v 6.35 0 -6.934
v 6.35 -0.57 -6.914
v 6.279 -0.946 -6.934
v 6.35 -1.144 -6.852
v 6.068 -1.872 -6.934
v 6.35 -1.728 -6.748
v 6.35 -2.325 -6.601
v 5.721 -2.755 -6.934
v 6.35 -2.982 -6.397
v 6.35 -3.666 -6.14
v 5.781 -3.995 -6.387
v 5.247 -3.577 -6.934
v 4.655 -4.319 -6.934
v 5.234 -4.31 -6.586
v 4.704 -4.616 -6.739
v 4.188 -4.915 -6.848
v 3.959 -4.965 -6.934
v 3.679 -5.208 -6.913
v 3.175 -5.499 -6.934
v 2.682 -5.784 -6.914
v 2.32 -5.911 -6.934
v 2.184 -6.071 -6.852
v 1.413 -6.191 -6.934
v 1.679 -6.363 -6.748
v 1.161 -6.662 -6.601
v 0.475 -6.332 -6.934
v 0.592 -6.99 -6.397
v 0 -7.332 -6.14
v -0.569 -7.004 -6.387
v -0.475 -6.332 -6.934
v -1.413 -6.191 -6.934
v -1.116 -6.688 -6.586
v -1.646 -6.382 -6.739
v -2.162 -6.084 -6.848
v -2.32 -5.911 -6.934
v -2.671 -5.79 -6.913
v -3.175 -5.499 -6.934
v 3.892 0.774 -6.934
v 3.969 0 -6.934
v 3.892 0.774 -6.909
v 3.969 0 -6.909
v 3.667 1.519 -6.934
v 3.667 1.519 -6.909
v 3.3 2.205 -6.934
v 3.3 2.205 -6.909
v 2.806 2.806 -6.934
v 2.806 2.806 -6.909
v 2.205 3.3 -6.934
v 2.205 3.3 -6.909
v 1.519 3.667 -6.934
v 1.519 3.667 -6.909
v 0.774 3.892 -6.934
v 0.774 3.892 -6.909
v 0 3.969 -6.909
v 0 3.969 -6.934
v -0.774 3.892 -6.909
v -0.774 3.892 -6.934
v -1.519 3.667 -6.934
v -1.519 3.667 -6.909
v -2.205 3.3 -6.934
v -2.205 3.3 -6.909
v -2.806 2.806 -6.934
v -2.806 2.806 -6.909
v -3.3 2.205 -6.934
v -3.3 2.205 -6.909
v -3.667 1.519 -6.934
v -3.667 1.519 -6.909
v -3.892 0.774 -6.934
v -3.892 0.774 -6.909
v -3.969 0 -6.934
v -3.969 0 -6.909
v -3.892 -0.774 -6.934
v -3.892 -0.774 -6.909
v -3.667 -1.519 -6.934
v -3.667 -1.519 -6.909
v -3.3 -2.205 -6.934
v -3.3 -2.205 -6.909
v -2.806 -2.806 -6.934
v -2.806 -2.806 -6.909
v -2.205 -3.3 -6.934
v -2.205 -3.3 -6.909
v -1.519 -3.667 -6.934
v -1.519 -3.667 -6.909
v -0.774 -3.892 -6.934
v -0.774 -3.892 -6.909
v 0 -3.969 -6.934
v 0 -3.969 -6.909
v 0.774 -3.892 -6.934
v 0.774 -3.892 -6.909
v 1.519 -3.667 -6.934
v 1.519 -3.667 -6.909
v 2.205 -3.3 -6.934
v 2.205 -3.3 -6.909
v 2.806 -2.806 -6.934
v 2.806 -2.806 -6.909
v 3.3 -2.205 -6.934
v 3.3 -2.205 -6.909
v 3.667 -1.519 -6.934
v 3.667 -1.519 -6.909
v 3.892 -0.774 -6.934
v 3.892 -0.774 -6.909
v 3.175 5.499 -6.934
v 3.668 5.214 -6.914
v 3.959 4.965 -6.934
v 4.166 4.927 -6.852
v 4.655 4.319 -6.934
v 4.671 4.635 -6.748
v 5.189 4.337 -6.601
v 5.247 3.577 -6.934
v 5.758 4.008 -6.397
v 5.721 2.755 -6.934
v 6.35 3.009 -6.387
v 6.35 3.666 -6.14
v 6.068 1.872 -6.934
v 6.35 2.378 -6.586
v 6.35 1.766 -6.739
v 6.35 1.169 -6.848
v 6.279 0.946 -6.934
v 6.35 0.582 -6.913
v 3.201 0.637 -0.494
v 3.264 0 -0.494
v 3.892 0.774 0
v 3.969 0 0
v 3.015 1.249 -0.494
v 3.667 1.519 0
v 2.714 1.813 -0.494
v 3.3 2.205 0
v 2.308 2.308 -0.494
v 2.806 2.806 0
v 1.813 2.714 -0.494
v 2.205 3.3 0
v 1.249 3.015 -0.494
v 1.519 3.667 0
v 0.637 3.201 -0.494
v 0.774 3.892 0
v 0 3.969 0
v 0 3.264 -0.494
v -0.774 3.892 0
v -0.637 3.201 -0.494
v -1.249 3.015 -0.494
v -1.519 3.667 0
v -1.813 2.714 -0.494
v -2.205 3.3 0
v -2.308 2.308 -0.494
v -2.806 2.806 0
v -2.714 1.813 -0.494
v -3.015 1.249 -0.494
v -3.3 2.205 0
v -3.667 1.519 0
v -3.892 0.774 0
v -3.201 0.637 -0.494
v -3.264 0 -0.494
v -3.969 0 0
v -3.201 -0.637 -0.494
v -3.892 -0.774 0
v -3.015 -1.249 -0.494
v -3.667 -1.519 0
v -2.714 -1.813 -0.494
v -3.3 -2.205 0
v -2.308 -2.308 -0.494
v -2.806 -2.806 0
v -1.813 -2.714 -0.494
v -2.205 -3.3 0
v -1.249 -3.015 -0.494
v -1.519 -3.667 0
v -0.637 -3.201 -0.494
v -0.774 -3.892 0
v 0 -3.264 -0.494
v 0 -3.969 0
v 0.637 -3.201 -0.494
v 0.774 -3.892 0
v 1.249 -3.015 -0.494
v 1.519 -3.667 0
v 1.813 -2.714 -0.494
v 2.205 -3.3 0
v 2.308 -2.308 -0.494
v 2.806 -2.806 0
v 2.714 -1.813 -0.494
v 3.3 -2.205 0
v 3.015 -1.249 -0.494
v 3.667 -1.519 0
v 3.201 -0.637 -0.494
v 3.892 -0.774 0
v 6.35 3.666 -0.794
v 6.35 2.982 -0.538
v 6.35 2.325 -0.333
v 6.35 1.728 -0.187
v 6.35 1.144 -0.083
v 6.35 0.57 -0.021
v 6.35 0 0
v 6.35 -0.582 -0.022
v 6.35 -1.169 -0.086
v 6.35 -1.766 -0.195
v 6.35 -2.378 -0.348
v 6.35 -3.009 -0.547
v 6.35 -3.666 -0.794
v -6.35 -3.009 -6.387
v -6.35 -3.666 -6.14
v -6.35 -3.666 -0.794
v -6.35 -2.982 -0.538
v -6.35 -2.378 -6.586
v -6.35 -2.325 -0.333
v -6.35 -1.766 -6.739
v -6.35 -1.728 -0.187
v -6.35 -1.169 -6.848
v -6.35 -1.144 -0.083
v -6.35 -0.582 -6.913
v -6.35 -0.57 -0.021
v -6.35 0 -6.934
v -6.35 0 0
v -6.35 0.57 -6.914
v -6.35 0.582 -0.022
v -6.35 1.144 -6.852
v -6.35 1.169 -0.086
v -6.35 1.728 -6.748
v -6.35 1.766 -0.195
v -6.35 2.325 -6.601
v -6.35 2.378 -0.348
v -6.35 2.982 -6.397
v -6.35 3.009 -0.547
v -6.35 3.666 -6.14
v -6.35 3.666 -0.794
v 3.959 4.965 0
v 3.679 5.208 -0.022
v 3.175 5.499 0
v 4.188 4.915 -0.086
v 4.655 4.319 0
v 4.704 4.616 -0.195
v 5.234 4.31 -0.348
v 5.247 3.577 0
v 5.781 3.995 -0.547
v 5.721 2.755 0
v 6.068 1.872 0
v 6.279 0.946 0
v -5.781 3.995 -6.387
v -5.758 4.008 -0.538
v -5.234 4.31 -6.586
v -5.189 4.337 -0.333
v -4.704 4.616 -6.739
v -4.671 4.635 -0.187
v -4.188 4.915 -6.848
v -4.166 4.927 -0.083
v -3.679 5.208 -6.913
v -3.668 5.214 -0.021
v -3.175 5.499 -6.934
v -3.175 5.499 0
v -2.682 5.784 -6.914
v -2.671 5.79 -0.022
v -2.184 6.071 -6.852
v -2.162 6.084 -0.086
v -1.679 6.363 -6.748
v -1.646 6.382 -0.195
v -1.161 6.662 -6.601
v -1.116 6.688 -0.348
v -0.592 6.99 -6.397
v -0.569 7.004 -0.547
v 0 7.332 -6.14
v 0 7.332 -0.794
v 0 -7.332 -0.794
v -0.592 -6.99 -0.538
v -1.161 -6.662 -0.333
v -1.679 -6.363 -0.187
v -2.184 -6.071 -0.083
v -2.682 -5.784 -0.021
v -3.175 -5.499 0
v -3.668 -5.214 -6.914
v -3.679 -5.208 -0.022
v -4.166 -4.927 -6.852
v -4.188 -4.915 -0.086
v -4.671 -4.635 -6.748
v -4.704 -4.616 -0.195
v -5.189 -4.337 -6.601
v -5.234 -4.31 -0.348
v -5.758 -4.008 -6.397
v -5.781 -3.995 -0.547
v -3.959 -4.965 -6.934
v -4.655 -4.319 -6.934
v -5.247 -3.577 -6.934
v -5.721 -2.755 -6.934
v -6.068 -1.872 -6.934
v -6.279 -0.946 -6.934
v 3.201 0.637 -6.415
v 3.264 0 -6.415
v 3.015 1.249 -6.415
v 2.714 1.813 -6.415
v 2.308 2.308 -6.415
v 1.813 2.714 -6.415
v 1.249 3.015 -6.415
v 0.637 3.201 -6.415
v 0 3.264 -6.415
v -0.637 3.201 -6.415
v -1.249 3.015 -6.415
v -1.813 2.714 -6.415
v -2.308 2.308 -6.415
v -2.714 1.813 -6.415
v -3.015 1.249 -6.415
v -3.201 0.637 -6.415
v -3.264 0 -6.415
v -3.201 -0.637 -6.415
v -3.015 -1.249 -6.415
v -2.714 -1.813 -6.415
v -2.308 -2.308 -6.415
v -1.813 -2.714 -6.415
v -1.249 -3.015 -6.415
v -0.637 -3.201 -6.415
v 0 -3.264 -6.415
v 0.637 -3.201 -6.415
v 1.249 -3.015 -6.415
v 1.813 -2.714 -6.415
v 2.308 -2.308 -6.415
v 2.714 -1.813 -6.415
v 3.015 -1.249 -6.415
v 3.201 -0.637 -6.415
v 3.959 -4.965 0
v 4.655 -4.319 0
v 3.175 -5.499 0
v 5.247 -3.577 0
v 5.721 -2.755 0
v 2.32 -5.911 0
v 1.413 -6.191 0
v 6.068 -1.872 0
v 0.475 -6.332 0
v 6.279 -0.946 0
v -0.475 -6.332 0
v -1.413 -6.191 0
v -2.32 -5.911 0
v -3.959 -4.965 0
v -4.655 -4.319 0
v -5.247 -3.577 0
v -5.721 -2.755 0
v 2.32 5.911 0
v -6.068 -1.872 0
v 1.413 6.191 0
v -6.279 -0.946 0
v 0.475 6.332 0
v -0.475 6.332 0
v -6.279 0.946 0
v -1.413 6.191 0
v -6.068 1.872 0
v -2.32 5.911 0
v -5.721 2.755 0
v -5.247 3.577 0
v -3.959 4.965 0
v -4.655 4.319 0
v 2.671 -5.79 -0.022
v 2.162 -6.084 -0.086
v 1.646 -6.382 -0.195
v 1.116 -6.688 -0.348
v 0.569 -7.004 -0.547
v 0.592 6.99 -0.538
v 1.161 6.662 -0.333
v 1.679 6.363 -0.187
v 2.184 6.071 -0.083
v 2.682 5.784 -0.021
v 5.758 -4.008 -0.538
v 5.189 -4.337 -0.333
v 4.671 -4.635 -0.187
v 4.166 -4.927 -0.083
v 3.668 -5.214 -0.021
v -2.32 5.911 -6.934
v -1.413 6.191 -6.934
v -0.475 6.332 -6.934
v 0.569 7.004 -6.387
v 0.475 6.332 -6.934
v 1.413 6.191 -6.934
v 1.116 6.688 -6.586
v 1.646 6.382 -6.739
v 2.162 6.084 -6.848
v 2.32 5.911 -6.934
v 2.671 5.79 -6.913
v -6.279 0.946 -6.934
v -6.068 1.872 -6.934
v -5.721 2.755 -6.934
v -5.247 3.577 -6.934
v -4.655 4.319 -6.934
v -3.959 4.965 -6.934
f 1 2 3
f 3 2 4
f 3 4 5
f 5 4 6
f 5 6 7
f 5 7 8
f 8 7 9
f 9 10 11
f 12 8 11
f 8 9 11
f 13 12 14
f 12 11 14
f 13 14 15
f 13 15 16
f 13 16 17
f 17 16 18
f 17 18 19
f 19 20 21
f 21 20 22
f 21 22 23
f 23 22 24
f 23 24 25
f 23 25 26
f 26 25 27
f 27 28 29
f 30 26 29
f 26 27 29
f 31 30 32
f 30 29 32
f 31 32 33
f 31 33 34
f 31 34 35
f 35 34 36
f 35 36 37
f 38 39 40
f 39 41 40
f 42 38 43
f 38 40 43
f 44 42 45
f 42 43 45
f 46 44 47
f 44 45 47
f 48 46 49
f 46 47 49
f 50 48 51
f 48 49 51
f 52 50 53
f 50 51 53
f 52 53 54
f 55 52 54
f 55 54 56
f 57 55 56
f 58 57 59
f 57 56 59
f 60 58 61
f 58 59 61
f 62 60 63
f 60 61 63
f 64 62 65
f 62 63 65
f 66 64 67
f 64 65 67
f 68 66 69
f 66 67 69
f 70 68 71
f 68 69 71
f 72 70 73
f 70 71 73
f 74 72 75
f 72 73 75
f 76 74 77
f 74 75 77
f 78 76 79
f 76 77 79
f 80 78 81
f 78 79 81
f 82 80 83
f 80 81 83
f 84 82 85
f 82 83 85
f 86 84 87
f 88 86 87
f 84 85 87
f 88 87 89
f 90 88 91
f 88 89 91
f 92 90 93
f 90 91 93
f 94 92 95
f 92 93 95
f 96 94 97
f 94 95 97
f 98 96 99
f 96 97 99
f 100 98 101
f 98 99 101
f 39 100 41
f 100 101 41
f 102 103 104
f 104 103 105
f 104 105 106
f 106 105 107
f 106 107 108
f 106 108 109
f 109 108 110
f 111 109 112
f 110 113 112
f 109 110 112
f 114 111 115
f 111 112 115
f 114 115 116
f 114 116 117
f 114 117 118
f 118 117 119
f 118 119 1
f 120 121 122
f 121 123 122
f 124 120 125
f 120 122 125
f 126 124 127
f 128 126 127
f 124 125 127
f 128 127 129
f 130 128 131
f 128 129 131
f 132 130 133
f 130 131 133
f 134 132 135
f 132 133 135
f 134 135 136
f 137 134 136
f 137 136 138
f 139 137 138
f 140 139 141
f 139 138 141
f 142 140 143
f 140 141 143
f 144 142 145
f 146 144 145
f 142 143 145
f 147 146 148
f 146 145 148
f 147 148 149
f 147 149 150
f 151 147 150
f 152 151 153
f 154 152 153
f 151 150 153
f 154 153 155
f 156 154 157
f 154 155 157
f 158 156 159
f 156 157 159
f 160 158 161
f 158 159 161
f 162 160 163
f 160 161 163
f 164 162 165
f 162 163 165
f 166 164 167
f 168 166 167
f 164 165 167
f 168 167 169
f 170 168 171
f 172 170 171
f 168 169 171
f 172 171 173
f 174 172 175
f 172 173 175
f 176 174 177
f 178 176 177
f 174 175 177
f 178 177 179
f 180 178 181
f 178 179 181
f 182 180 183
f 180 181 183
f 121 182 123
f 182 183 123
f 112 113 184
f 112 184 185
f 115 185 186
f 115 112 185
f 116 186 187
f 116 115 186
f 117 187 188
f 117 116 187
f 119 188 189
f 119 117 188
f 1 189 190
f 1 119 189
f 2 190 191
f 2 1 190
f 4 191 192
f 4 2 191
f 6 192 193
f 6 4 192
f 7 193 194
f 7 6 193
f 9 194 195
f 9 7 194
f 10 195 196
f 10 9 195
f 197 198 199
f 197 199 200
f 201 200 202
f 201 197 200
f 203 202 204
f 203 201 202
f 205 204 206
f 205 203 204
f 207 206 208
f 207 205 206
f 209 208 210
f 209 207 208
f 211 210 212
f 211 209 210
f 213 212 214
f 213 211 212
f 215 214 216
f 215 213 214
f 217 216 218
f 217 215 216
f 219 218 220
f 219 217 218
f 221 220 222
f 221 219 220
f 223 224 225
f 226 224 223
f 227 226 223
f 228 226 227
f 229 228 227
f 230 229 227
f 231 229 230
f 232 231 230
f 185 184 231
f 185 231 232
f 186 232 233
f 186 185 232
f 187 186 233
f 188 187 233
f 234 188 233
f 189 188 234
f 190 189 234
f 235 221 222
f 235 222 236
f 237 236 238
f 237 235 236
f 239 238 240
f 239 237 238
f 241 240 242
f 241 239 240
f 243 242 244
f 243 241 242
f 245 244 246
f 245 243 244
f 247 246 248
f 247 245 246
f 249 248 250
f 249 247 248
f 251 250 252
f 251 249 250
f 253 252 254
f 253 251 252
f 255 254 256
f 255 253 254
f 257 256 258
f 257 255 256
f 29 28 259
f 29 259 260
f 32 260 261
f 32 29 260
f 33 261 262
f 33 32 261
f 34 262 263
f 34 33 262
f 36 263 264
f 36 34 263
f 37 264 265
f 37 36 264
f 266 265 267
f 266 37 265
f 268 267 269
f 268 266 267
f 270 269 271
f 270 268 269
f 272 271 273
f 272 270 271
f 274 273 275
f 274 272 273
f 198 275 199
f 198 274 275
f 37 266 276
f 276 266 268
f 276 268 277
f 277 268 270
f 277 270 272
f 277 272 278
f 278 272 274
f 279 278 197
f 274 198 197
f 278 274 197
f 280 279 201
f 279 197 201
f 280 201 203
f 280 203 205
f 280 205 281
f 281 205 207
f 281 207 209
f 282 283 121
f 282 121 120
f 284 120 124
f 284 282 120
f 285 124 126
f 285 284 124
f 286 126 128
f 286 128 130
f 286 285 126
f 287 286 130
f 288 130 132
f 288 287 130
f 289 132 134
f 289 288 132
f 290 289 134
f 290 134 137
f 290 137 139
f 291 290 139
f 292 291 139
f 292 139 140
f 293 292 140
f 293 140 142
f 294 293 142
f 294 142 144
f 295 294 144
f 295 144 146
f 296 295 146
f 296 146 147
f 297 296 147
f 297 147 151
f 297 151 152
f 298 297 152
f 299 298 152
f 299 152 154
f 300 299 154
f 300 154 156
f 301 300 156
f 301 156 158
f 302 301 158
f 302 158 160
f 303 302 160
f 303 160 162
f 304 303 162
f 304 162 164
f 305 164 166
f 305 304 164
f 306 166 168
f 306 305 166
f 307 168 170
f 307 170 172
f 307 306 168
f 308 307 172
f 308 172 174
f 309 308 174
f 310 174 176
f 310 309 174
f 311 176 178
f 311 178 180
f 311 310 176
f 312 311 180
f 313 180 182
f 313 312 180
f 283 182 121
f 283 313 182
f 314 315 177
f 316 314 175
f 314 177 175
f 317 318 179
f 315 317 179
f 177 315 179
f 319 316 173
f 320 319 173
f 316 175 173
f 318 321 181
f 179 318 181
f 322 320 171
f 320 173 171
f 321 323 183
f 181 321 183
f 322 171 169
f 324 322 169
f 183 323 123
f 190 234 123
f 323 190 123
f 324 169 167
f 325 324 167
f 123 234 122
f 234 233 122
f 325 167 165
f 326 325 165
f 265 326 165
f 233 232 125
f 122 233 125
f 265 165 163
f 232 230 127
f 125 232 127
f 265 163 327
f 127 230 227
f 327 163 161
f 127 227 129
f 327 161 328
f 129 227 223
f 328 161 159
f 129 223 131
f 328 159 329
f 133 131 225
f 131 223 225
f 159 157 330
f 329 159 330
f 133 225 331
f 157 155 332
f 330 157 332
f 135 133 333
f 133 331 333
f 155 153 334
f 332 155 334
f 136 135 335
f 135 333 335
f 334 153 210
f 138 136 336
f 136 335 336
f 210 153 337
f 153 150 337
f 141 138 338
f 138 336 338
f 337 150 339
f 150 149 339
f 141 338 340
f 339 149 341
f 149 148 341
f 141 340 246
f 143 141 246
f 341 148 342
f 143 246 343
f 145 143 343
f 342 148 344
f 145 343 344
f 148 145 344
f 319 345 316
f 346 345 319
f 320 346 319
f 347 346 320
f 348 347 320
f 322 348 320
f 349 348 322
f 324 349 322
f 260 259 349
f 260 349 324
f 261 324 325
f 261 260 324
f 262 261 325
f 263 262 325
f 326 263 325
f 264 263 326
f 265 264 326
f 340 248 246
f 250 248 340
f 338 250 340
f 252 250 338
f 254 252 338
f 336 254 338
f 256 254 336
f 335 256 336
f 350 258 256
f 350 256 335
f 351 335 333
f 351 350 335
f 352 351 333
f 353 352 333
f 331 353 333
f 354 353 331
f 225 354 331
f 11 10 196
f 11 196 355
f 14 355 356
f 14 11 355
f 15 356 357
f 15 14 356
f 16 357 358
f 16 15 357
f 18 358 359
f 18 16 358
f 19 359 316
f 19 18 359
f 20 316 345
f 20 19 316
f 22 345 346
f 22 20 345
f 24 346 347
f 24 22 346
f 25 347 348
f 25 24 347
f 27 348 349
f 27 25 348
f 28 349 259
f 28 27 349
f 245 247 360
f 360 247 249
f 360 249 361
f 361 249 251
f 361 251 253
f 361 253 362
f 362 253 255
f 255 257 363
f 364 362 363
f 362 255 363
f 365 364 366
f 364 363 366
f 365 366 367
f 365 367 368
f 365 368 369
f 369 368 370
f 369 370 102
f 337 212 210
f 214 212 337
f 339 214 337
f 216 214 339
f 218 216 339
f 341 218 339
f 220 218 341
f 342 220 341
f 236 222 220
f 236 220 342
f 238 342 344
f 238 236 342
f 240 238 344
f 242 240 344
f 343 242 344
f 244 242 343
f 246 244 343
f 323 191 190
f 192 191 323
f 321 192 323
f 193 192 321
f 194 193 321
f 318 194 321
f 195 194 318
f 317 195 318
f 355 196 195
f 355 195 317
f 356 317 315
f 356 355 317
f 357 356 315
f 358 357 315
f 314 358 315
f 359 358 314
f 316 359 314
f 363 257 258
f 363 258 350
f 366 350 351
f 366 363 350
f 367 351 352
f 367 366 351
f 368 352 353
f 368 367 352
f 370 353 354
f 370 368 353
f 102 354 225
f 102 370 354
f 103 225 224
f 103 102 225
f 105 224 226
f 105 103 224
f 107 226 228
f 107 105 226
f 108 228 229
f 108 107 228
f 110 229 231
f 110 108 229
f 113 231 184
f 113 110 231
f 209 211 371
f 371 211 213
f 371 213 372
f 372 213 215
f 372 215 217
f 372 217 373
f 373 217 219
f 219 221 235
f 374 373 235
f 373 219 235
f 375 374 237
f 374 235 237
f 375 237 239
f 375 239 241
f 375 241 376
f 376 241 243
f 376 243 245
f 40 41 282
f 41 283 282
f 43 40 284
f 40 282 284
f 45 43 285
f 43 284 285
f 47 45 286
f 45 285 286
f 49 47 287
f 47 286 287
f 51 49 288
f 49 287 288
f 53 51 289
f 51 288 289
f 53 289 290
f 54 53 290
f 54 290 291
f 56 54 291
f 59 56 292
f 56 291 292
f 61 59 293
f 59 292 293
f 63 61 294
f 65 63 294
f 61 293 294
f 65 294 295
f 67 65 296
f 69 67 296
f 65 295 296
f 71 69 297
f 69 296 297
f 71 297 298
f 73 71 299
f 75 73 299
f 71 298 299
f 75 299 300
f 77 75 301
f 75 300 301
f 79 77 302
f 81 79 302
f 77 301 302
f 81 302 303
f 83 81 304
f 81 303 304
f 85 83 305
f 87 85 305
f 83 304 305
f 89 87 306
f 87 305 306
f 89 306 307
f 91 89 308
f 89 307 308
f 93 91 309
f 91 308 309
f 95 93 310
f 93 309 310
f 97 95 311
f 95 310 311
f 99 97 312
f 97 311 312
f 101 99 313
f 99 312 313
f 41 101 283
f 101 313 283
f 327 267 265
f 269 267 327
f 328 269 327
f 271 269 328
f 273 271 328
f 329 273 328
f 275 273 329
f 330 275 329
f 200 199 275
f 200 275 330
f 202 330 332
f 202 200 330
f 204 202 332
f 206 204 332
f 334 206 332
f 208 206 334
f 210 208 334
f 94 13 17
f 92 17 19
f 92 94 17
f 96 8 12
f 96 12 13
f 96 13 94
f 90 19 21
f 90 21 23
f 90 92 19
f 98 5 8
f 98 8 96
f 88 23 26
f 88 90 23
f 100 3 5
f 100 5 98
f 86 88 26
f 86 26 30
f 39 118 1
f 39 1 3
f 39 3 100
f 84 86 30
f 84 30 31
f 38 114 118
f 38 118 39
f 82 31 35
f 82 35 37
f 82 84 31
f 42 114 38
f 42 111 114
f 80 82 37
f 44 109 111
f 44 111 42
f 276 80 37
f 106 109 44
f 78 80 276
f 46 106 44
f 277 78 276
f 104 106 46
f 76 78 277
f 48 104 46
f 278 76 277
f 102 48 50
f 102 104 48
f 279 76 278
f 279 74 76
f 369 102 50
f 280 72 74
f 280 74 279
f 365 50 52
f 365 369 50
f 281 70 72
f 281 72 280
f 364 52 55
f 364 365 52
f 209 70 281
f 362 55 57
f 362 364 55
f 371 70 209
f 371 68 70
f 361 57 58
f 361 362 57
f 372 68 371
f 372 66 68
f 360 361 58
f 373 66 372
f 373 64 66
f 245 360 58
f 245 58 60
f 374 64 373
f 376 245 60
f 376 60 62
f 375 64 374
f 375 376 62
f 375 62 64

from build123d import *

# Parameters (mm, degrees)
BASENUT_START = -6.9342
BASENUTSKE_R  = 3.2639
BASENUT_DEPTH = 6.9342


# Read off the part's stored shape, not the designer's step: ThreadSchematic
with BuildPart() as part:
    # BaseNutSke → BaseNut (new body)
    with BuildSketch(Plane.XY.offset(BASENUT_START)):
        Polygon((6.35, 3.666174209), (6.35, -3.666174209), (0, -7.332348419), (-6.35, -3.666174209), (-6.35, 3.666174209), (0, 7.332348419), align=None)
        Circle(BASENUTSKE_R, mode=Mode.SUBTRACT)
    extrude(amount=BASENUT_DEPTH)

    # Sketch5 (on Front Plane) → EndChamfer (revolve, cut)
    with BuildSketch(Plane.XY):
        Polygon((6.9088, 3.96875), (6.365904588, 3.193415), (6.9596, 3.193415), (6.9596, 3.96875), align=None)
    revolve(axis=Axis((6.9088, 3.96875, 0), (-0.5735764363510457, -0.819152044288992, 0)), mode=Mode.SUBTRACT)

    # Sketch3 → Double-Chamfer (revolve, cut)
    with BuildSketch(Plane(origin=(0, 0, 0), x_dir=(0, 0, -1), z_dir=(1, 0, 0))):
        Polygon((6.9342, 6.35), (6.14045, 7.332348419), (6.14045, 20.032348419), (19.6342, 20.032348419), (19.6342, 6.35), align=None)
        Polygon((0.79375, 20.032348419), (-12.7, 20.032348419), (-12.7, 6.35), (0, 6.35), (0.79375, 7.332348419), align=None)
    revolve(axis=Axis((0, 0, 0), (0, 0, -1)), mode=Mode.SUBTRACT)

    # ThreadSchematic outline → ThreadSchematic (revolve, cut)
    with BuildSketch(Plane.XZ):
        Polygon((3.2639, 0), (3.2639, -0.493541283), (3.96875, 0), align=None)
        Polygon((3.96875, -6.9088), (3.2639, -6.415258717), (3.2639, -6.9342), (3.96875, -6.9342), align=None)
    revolve(axis=Axis((0, 0, 0), (0, 0, 1)), mode=Mode.SUBTRACT)


solid = part.part
